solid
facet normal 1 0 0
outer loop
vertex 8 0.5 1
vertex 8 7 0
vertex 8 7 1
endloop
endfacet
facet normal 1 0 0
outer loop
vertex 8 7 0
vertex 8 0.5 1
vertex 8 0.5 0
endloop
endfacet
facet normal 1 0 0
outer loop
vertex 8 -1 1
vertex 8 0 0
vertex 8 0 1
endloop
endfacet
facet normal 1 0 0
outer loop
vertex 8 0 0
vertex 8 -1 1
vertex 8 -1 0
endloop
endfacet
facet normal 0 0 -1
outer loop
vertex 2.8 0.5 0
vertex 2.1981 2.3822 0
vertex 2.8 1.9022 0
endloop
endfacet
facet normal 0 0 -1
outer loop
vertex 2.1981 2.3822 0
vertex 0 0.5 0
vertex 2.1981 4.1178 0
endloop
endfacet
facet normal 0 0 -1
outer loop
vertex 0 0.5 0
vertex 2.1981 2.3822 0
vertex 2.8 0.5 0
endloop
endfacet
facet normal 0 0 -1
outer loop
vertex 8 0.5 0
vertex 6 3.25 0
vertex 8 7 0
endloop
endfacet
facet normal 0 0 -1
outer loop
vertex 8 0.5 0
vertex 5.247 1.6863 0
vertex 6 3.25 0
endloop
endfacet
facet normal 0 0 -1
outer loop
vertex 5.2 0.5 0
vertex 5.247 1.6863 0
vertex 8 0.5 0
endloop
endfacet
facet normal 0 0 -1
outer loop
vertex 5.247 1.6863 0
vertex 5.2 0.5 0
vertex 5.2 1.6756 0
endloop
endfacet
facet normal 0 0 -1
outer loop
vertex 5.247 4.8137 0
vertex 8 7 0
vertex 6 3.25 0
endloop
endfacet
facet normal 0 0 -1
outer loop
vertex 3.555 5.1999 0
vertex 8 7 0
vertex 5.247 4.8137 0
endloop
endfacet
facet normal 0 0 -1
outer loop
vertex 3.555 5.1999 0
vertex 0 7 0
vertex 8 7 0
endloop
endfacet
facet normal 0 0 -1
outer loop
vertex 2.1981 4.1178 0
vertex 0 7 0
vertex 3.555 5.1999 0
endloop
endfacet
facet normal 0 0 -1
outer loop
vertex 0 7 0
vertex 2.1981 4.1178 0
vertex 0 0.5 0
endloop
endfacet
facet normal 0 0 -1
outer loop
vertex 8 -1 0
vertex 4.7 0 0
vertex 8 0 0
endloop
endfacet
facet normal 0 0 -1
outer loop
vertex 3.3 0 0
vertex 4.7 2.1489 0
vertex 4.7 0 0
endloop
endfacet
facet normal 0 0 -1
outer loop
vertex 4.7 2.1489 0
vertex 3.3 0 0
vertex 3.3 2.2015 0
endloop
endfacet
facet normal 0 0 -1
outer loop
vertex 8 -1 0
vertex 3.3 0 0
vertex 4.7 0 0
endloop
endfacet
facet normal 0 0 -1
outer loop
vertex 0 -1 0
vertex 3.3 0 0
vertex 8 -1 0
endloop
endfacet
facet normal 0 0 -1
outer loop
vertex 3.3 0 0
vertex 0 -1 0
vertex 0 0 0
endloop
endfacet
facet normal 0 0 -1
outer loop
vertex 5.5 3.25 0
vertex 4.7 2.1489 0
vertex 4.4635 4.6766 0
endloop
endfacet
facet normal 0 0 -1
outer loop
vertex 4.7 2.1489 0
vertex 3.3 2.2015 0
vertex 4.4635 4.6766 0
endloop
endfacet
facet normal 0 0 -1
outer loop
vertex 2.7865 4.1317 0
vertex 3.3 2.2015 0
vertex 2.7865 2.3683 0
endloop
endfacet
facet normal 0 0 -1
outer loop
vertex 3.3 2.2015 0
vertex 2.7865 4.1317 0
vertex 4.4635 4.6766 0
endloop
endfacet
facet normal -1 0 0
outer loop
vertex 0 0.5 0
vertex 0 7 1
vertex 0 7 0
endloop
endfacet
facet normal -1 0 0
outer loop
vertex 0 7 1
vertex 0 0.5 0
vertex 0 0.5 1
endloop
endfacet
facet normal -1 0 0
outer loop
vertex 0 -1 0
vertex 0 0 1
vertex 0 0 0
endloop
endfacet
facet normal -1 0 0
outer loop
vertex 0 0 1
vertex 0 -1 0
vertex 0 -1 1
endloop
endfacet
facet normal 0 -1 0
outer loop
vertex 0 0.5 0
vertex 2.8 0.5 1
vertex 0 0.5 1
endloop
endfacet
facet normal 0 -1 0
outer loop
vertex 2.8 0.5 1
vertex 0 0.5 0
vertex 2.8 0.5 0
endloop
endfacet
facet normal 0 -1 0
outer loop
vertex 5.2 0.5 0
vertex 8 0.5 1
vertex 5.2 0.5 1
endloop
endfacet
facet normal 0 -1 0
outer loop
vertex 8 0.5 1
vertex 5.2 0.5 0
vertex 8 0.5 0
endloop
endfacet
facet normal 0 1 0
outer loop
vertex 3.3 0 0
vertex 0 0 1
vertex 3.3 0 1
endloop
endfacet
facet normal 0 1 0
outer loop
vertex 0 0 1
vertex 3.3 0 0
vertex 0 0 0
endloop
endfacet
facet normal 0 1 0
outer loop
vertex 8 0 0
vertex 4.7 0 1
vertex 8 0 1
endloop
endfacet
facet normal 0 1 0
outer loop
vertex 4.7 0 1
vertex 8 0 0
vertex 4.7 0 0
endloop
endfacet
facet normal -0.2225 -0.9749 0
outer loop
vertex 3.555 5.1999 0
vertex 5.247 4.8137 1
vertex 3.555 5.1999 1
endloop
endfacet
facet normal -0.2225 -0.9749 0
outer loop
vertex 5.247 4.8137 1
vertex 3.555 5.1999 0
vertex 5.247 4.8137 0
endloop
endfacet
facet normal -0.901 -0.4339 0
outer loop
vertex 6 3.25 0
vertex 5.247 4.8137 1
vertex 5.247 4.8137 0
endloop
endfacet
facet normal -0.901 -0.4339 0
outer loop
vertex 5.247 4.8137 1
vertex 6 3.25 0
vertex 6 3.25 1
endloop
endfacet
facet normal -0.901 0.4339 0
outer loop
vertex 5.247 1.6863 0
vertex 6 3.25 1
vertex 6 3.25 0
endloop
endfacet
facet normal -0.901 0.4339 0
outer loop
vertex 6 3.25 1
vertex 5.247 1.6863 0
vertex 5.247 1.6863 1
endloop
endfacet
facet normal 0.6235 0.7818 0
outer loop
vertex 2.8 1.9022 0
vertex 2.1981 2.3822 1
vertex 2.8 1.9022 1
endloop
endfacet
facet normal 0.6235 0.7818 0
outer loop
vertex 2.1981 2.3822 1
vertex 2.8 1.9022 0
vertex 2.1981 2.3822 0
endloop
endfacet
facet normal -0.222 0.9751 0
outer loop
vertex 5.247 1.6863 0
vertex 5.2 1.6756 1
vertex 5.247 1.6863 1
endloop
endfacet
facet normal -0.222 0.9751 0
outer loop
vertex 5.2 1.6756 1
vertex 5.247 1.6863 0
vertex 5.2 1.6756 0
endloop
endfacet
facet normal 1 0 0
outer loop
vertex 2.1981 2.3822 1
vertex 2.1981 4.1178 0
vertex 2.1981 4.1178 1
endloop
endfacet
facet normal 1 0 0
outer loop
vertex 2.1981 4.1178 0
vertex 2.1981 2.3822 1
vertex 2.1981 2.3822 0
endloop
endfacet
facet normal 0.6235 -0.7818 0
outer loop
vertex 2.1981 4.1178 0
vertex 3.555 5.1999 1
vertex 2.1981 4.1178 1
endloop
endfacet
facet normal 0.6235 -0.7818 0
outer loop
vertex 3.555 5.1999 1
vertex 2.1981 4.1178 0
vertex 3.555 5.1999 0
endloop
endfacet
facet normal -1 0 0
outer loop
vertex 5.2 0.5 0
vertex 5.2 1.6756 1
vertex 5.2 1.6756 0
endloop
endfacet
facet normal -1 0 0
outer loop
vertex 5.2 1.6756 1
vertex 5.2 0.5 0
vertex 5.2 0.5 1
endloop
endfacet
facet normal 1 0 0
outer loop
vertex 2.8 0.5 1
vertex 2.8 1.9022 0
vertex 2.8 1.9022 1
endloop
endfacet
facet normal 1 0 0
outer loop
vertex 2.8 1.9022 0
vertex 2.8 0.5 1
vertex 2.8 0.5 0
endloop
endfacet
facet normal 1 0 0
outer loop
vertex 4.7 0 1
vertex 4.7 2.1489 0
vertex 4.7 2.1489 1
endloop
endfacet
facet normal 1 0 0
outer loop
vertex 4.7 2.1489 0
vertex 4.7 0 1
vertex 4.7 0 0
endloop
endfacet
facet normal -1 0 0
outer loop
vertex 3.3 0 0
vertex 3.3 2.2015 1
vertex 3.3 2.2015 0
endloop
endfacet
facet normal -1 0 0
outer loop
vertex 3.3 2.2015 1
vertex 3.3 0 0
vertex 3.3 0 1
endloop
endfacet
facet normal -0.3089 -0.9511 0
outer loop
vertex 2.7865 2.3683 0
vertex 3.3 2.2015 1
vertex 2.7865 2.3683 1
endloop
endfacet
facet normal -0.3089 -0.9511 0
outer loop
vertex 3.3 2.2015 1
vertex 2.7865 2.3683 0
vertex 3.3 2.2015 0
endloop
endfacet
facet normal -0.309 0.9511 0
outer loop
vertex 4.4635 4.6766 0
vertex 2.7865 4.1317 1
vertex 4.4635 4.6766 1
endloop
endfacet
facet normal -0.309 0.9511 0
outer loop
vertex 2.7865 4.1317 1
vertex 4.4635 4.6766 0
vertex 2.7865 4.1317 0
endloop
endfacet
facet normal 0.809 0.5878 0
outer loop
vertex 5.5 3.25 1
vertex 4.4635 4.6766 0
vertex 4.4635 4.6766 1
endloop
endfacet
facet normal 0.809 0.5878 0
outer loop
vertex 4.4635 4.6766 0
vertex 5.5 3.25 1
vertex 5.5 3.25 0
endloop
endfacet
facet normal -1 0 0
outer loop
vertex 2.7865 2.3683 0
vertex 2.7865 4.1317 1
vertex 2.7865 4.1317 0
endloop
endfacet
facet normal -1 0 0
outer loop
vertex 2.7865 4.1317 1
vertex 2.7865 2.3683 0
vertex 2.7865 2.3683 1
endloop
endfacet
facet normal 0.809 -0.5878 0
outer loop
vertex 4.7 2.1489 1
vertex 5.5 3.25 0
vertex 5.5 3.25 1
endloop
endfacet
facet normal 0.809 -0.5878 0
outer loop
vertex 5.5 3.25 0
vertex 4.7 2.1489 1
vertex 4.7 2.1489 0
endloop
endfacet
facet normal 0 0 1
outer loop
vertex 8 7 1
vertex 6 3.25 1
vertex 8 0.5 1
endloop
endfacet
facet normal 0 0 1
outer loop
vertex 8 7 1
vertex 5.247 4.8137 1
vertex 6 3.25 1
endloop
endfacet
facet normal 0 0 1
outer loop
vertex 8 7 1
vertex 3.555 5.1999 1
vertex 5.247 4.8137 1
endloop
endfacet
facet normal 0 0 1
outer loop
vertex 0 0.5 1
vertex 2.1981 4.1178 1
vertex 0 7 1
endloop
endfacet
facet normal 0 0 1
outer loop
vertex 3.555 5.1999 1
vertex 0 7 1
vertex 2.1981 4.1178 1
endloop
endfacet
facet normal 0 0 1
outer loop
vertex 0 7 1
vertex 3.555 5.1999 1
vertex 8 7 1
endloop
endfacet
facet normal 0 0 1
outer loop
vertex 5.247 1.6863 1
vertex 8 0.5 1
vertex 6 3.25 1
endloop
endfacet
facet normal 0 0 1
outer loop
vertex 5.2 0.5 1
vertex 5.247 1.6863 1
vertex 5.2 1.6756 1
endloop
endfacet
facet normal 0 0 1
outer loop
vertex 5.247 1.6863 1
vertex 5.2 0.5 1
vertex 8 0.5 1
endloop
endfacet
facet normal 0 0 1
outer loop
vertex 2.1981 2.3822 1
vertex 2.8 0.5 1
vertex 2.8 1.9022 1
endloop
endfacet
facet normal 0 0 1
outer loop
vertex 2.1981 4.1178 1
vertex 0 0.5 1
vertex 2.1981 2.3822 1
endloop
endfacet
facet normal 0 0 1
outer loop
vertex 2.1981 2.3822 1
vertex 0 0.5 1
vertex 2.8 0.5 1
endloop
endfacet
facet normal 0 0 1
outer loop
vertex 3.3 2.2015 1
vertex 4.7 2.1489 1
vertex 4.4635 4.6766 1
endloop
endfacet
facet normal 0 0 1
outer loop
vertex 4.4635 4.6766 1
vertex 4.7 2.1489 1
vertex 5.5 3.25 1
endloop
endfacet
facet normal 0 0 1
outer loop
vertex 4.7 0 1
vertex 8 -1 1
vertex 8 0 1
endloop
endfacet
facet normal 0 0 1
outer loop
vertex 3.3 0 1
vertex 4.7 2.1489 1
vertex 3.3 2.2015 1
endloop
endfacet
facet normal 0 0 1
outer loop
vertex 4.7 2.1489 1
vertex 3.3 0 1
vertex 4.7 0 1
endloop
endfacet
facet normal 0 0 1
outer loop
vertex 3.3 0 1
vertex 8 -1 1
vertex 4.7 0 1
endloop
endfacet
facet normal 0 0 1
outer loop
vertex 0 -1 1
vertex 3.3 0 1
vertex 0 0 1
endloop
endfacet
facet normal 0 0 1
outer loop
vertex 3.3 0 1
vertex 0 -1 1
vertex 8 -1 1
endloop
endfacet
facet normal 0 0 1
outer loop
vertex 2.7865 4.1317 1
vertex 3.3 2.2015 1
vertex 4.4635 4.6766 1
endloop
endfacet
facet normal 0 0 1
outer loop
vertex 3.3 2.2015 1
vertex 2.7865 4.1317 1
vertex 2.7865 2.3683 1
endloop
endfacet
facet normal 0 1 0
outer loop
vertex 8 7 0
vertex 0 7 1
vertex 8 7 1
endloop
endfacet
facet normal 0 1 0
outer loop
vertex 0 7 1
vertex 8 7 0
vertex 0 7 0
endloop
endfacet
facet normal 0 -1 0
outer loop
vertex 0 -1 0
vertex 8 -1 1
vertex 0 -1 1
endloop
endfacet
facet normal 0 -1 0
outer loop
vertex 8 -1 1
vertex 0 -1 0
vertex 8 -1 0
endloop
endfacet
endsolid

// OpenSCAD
module puzzle_cut(r=5,z=3, width=1,length=40,out_by=1.3){
  subr = r * 0.6;
  difference(){
    union(){
      cube([length,width,z]);
      translate([length/2,(r + width)*out_by,0]){
       difference(){
          cylinder(r=r,h=z);
        }
      }
      translate([length/2 - subr,0,0]){
        cube([2 * subr,(r + width) * out_by,z]);
      }
    }
    union(){
      translate([length/2 - subr + width, 0,0]){
        cube([2 * (subr - width), (r + width) * out_by, z]);
      }
      translate([length/2,(r + width)*out_by,0]){
        cylinder(r=r-width,h=z);
      }
    }
  }
}

module puzzle(r=5,z=3,width=1,length=40,out_by=1.3,n=1){
  for(i=[1:2:n]){
    translate([(i-1) * length,0,0]){
      puzzle_cut(r,z,width,length,out_by);
    }
  }
  for(i=[2:2:n]){
    mirror([0,1,0]){
    translate([(i-1) * length,-width,0]){
      puzzle_cut(r,z,width,length,out_by);
    }
    }
  }
}
difference(){
  translate([0,-1,0]) cube([8,8,1]);
  puzzle(n=1,width=0.5,r=2,length=8);
}
